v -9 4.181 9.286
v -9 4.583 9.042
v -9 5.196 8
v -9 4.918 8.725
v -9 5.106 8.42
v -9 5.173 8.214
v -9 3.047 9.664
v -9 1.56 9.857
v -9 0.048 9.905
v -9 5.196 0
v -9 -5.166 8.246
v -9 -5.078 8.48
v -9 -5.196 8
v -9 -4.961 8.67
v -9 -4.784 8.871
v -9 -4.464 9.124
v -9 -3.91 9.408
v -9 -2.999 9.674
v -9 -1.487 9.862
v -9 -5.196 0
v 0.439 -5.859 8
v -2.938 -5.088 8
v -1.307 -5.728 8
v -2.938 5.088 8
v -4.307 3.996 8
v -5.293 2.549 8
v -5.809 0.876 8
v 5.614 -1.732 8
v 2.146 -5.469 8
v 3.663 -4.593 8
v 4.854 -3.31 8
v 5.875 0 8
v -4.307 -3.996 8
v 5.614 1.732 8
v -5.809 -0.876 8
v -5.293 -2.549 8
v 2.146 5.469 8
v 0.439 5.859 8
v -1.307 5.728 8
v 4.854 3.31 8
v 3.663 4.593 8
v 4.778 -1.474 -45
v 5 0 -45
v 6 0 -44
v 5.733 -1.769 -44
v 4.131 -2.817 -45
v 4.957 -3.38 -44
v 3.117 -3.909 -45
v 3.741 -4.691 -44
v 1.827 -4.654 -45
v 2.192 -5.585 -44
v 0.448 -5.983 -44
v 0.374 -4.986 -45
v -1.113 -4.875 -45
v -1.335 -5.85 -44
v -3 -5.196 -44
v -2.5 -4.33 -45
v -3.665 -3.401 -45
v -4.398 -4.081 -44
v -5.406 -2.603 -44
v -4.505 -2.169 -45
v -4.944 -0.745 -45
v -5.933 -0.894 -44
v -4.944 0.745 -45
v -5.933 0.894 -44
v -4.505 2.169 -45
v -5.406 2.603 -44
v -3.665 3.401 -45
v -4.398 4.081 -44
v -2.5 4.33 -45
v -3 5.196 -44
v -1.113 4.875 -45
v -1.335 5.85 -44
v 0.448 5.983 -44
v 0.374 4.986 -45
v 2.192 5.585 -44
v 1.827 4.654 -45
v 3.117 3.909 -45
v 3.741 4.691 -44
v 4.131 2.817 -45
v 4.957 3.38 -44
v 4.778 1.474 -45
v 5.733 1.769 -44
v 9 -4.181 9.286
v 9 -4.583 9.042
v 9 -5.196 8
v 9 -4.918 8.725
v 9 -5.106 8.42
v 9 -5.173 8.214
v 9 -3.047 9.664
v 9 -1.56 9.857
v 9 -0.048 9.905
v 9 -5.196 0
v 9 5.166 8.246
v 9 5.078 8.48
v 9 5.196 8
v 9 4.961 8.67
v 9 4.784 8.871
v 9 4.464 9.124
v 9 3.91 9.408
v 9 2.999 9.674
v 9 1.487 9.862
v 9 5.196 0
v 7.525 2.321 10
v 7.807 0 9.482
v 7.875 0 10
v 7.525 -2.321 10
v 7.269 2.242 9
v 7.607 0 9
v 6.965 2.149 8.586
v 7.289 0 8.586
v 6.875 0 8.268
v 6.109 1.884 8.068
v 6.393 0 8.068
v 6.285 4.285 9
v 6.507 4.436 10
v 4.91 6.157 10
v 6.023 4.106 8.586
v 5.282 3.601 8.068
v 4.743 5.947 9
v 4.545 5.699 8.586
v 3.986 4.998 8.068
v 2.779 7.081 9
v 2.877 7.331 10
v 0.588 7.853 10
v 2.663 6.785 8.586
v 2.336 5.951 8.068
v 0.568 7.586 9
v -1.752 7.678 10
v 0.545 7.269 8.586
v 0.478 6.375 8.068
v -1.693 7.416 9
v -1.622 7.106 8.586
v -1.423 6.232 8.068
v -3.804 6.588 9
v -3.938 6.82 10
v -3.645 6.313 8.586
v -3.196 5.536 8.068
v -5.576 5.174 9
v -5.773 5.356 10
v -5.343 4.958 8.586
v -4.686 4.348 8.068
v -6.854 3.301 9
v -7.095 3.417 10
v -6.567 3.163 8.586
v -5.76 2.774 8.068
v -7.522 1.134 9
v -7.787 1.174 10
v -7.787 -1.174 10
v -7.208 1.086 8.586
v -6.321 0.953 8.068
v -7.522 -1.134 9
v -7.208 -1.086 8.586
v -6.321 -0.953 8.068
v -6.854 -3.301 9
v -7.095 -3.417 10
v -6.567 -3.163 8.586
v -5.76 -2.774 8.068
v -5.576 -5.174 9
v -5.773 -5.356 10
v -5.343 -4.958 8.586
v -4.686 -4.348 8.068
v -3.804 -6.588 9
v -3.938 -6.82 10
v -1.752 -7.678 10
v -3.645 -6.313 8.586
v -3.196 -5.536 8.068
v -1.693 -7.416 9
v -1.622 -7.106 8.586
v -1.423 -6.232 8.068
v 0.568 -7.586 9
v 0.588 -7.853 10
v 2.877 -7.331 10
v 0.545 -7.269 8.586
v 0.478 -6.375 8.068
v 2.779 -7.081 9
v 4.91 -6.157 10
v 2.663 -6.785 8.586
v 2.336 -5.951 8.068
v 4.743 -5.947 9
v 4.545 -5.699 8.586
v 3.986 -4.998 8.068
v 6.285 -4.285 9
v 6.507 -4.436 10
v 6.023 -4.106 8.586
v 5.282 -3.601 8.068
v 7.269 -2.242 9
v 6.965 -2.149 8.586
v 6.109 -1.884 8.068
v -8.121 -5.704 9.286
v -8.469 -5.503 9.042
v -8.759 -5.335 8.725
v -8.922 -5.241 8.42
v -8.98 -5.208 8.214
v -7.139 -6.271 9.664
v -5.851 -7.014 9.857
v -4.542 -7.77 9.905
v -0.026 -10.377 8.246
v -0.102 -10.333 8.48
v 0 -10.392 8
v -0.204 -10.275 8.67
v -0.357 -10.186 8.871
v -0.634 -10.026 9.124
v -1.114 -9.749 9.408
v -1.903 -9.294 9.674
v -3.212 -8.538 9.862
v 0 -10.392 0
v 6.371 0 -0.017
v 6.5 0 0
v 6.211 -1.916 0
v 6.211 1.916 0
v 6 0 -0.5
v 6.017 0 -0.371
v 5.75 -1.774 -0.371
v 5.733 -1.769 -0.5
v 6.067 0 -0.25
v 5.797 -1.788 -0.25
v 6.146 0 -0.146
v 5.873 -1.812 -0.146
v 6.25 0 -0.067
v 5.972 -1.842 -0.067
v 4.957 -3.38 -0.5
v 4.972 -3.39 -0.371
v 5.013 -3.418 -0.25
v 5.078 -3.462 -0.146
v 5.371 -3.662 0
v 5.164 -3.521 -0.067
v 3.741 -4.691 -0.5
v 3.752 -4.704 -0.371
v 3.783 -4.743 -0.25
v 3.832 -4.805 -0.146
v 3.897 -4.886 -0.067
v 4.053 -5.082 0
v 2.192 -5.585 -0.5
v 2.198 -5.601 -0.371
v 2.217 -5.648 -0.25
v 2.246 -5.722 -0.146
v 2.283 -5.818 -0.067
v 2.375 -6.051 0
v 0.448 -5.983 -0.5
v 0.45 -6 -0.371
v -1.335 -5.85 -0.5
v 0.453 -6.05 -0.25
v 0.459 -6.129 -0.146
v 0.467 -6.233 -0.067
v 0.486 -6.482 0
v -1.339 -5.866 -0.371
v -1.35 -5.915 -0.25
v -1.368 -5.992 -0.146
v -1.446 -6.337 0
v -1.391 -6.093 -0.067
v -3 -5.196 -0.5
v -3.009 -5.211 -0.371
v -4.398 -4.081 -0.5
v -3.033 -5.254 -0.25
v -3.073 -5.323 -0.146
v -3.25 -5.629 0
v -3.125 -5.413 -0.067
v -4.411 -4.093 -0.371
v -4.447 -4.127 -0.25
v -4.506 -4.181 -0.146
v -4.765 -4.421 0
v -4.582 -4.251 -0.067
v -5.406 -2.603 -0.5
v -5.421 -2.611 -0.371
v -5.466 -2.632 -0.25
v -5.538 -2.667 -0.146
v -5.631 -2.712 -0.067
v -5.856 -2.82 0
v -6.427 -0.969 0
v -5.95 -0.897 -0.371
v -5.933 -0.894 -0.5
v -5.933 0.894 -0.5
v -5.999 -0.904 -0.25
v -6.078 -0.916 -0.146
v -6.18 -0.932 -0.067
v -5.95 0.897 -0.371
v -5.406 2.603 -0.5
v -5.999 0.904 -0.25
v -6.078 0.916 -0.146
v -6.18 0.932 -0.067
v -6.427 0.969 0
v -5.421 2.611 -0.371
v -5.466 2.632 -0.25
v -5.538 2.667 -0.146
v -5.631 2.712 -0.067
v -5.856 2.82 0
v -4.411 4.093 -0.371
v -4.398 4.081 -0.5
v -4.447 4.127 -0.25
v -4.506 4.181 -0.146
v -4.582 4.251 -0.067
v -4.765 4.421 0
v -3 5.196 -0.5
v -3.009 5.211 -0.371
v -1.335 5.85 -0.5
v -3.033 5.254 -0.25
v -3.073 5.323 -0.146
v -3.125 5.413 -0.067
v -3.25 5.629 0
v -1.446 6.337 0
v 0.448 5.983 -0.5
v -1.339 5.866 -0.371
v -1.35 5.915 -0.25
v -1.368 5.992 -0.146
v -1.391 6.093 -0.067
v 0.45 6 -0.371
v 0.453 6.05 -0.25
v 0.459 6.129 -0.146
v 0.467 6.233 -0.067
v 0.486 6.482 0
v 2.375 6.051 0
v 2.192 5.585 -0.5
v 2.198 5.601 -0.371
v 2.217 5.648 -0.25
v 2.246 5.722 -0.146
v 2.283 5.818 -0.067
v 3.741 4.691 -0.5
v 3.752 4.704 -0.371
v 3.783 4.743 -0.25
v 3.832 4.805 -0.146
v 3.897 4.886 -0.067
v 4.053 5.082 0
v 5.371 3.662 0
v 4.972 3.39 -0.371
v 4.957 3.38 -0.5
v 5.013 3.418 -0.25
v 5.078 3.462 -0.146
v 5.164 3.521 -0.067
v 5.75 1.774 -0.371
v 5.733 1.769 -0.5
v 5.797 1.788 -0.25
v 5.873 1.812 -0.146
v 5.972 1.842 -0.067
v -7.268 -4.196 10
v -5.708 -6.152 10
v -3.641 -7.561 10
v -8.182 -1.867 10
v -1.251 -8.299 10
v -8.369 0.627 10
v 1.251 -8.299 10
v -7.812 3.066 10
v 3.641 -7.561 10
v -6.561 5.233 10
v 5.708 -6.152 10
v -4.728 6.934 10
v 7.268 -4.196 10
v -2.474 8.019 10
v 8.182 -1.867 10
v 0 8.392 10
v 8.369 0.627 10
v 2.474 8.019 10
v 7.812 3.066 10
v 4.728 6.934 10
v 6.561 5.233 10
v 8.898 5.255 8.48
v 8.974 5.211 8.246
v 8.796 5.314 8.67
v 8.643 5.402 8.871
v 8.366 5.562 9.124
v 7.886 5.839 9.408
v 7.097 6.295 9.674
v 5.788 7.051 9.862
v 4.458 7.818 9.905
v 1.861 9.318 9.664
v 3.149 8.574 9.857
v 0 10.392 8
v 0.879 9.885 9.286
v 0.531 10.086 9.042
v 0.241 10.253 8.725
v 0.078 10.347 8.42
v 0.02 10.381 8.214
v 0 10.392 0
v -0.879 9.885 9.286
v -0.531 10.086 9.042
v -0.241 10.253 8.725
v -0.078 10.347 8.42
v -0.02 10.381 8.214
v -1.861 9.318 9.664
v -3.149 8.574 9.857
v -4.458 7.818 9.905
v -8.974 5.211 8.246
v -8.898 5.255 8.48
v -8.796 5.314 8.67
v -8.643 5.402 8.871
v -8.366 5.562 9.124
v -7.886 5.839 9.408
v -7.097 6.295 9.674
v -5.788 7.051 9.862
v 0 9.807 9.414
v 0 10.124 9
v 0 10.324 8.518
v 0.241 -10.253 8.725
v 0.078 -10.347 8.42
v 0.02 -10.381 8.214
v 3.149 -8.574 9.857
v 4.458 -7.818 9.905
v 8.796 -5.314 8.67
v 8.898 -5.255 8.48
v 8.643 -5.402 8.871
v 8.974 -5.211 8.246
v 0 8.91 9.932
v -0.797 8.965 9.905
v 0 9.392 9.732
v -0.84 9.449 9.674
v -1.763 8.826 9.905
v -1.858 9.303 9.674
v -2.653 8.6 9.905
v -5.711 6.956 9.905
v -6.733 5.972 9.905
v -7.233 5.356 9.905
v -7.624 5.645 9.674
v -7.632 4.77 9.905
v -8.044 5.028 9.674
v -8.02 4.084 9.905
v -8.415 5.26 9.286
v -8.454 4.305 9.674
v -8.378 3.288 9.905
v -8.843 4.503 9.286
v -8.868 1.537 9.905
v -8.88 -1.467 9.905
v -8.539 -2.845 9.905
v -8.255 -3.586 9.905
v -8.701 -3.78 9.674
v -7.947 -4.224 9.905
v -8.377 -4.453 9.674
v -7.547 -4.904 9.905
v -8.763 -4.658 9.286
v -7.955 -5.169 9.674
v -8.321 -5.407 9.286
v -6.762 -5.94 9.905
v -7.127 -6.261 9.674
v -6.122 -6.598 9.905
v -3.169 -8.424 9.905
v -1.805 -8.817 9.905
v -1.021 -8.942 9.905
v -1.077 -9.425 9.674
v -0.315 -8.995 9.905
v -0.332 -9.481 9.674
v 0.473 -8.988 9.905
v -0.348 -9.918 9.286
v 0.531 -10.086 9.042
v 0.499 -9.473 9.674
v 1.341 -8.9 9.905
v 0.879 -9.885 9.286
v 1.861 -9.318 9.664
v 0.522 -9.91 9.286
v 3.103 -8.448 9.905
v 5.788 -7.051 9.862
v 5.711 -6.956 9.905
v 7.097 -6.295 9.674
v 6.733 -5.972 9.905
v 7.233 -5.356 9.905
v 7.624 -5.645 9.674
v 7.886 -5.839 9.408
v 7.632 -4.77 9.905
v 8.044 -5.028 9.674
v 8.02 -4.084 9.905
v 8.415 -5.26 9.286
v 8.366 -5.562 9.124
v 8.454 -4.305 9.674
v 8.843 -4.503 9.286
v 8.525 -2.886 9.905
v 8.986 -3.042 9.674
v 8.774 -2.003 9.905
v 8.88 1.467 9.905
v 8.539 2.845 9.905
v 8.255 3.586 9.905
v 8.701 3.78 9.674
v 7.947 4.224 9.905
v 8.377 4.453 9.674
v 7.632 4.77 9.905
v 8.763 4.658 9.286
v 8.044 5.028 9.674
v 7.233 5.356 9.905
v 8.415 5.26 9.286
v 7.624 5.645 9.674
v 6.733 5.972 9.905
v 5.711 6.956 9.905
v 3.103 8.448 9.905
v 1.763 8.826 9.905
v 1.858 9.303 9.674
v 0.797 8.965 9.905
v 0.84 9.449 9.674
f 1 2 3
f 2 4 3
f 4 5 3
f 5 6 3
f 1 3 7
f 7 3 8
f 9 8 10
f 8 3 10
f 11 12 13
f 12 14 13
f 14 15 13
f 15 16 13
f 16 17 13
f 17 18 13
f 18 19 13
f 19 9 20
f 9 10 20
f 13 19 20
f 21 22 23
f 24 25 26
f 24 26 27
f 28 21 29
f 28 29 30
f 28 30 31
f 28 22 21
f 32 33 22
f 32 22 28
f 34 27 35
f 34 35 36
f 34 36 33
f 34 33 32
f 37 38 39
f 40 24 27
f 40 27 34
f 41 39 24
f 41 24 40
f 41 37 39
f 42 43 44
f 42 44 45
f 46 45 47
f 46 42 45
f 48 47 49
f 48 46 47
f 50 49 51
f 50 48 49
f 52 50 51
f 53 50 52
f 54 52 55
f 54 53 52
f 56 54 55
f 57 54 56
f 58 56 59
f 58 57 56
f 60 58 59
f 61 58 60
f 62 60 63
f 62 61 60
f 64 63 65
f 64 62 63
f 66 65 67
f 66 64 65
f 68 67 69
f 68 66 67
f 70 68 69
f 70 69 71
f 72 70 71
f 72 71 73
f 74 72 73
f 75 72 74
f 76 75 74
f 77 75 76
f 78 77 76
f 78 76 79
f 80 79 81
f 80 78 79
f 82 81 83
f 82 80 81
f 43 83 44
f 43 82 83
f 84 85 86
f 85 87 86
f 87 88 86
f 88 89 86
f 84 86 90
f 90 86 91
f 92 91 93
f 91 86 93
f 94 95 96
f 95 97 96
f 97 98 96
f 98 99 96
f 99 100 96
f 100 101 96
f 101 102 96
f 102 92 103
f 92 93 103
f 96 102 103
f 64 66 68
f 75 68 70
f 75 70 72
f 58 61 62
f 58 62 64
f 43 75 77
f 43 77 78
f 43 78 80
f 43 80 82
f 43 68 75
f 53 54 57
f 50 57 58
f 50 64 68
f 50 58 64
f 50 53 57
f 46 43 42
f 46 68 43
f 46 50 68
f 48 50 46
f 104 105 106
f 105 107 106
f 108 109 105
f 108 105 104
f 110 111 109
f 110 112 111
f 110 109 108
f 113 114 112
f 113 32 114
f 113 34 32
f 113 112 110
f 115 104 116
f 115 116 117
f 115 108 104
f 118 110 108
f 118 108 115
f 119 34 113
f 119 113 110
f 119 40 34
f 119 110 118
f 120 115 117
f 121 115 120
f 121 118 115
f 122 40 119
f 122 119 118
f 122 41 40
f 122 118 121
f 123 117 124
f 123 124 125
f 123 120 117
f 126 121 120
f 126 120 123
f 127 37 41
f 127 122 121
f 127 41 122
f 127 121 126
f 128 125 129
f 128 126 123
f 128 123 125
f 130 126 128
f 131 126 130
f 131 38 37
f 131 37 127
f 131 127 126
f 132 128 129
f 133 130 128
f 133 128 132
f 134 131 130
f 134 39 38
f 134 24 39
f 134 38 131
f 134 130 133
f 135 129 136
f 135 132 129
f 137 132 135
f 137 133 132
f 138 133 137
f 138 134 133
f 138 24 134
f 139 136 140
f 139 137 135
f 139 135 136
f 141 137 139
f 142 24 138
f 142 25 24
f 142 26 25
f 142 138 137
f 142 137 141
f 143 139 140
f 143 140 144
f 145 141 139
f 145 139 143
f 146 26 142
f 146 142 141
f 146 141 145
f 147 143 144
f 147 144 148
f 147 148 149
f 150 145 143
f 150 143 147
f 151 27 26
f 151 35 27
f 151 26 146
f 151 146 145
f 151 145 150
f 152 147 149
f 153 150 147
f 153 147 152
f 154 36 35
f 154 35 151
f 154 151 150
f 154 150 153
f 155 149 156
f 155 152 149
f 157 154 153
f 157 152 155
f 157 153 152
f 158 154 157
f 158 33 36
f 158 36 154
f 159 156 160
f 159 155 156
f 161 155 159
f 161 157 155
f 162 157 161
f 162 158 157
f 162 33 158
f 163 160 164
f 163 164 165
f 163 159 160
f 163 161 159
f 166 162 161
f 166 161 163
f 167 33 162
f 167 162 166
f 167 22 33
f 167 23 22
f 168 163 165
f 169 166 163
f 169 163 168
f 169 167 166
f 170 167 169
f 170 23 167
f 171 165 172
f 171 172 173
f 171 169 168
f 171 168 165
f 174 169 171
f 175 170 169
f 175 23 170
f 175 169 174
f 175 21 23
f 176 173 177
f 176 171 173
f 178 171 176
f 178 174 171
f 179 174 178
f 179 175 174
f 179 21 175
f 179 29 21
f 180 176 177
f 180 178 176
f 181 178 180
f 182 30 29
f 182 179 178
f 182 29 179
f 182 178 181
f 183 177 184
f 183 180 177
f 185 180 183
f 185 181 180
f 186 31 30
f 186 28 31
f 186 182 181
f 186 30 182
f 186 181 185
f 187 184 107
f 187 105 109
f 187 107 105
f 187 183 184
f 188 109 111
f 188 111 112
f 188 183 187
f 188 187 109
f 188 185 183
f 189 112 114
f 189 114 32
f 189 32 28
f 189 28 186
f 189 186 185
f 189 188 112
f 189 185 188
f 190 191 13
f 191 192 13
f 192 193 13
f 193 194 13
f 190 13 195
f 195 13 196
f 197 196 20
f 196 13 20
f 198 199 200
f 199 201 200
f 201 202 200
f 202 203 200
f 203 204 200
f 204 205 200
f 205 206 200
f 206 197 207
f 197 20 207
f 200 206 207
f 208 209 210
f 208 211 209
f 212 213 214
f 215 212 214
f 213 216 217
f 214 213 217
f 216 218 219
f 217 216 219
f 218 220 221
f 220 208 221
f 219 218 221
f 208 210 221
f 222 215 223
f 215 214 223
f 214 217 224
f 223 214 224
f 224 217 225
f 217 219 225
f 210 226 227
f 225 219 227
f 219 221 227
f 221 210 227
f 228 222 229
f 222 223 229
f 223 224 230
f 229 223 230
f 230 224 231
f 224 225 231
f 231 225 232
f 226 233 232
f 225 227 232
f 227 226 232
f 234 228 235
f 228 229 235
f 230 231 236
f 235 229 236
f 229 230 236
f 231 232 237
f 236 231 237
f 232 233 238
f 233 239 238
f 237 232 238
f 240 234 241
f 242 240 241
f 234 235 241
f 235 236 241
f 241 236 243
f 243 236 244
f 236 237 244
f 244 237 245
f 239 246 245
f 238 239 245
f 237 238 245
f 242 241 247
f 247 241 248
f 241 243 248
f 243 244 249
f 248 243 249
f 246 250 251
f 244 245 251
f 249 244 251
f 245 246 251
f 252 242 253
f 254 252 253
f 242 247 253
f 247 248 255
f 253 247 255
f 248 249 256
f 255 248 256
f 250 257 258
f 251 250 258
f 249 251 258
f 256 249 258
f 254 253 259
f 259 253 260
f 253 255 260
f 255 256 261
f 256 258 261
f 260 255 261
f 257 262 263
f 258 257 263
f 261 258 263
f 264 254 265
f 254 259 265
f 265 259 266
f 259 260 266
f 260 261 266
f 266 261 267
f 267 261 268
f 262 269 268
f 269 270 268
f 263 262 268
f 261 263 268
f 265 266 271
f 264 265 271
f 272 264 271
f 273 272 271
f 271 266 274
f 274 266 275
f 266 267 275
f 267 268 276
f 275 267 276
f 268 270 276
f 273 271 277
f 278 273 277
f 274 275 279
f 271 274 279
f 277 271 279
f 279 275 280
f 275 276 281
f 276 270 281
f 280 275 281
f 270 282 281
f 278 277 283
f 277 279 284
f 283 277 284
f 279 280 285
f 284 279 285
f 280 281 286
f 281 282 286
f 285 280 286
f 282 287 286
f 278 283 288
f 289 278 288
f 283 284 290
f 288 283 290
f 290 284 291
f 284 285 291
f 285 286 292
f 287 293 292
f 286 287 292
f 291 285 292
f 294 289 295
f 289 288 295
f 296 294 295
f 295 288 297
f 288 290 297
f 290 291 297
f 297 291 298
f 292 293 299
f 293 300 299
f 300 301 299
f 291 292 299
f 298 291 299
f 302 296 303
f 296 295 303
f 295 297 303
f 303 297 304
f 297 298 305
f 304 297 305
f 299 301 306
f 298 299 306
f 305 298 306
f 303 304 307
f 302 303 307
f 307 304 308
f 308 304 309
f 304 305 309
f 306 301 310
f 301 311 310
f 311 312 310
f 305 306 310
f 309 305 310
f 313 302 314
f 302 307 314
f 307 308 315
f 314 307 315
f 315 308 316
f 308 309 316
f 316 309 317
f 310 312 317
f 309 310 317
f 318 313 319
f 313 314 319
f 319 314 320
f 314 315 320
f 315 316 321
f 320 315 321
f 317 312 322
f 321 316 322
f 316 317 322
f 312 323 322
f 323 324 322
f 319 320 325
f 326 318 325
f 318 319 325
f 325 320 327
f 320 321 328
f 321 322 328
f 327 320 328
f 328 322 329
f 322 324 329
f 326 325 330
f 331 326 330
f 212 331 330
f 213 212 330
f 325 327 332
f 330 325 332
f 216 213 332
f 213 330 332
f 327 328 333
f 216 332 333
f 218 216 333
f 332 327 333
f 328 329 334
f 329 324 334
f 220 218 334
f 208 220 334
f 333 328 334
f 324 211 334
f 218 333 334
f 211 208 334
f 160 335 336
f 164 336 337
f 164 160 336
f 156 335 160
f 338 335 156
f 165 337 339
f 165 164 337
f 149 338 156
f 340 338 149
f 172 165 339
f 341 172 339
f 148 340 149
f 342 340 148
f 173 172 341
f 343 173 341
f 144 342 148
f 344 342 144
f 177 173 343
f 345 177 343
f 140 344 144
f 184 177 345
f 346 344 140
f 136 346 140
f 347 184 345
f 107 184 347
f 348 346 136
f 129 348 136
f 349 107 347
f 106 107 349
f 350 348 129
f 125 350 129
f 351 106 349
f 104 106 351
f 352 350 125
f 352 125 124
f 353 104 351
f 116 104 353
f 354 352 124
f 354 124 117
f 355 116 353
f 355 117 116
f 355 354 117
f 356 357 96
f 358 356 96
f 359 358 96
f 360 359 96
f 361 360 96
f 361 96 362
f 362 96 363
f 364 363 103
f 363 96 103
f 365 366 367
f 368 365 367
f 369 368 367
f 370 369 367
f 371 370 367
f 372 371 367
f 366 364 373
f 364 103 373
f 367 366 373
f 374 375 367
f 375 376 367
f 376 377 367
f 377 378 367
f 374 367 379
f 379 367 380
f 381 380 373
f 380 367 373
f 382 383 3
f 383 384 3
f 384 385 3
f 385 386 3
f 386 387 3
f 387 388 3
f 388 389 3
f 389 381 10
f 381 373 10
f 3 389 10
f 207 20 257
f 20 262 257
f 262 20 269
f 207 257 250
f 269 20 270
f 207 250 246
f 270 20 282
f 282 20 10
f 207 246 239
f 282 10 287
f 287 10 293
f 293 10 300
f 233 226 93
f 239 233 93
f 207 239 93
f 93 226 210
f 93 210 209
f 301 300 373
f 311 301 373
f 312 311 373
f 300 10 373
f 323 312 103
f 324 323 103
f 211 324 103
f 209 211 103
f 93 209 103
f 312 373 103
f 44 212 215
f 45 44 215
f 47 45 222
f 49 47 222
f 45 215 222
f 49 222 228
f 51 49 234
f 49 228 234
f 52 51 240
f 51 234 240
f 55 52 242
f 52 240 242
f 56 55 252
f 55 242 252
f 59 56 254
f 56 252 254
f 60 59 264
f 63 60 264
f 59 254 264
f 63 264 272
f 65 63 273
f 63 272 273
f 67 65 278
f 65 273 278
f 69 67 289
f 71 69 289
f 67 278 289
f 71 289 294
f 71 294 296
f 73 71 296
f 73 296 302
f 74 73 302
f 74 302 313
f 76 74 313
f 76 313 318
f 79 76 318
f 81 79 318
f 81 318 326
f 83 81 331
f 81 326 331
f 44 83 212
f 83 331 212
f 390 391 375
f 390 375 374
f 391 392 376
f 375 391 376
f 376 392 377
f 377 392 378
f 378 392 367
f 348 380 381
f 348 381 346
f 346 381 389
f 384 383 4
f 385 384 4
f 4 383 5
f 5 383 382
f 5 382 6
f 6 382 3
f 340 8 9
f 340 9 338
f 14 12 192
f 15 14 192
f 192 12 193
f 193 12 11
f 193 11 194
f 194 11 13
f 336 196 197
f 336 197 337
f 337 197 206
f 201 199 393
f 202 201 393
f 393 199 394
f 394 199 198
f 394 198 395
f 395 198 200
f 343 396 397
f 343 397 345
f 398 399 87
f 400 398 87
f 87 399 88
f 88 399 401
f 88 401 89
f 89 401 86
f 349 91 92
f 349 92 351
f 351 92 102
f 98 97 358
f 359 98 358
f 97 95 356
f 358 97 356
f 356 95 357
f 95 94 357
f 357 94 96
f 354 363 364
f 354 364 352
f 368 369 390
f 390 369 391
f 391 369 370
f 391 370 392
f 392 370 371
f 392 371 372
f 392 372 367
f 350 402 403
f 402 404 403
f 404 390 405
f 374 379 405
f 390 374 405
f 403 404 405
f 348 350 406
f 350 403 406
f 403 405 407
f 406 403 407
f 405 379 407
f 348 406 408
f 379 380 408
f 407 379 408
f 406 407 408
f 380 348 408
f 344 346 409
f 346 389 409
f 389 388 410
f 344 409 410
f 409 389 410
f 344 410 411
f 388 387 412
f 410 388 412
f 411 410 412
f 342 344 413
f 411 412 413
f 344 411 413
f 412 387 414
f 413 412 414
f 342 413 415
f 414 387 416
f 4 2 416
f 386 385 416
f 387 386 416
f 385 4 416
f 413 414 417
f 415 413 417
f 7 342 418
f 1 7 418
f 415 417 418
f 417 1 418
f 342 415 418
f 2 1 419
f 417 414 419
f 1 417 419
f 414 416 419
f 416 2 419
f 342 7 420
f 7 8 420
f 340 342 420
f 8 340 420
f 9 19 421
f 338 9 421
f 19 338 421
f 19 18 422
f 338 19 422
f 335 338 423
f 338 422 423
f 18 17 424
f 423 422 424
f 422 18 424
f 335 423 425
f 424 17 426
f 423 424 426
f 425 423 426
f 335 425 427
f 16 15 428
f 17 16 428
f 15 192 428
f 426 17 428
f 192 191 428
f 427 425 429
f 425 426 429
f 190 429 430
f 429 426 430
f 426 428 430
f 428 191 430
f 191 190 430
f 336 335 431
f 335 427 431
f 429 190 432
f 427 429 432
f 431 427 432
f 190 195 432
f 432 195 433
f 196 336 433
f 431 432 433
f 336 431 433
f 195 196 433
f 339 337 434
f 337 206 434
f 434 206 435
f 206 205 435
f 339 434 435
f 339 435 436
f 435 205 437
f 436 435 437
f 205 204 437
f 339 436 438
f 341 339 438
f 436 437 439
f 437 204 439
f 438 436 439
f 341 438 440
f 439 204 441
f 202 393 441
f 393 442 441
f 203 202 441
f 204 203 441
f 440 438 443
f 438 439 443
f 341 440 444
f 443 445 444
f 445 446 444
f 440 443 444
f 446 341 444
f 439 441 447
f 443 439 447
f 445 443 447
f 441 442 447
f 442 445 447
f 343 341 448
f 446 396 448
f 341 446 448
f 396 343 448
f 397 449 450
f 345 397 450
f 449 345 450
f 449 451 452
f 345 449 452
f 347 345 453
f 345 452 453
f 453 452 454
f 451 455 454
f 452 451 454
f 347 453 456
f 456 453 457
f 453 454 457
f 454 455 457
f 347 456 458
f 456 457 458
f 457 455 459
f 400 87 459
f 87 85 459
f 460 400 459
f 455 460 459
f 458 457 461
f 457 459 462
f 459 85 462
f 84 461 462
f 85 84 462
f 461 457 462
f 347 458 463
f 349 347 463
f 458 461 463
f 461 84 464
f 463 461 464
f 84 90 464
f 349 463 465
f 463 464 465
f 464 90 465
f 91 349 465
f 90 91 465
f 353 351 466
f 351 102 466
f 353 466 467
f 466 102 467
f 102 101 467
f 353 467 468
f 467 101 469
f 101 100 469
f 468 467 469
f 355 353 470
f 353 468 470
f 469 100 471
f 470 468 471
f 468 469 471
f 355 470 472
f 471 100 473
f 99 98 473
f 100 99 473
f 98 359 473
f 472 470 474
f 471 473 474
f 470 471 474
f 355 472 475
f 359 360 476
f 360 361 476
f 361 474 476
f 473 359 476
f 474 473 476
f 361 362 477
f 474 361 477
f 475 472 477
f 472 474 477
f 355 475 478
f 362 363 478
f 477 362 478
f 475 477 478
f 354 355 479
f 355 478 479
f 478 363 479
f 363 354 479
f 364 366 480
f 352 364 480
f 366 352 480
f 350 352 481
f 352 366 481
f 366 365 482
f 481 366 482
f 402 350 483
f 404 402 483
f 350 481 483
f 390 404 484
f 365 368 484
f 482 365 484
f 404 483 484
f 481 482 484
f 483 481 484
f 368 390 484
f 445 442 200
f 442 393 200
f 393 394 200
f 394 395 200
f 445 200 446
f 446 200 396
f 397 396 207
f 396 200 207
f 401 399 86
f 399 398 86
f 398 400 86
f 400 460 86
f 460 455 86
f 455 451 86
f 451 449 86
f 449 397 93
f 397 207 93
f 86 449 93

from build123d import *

# Parameters (mm, degrees)
BOSS_EXTRUDE1_DEPTH = 10
SKETCH4_R           = 6
BOSS_EXTRUDE2_DEPTH = 45
CHAMFER1_SIZE       = 1
FILLET1_R           = 0.5
SKETCH6_R           = 7.875
CUT_EXTRUDE1_DEPTH  = 2
FILLET2_R           = 2


with BuildPart() as part:
    # Sketch3 → Boss-Extrude1 (new body)
    with BuildSketch(Plane.XY):
        Polygon((0, 10.392304845), (-9, 5.196152423), (-9, -5.196152423), (0, -10.392304845), (9, -5.196152423), (9, 5.196152423), align=None)
    extrude(amount=BOSS_EXTRUDE1_DEPTH)

    # Sketch4 → Boss-Extrude2 (add)
    with BuildSketch(Plane(origin=(0, 0, 0), x_dir=(-1, 0, 0), z_dir=(0, 0, -1))):
        with Locations(Location((0, 0, 0), (0, 0, 180))):
            Circle(SKETCH4_R)
    extrude(amount=BOSS_EXTRUDE2_DEPTH)

    # Chamfer1
    chamfer1_edges = [part.edges().sort_by_distance(p)[0] for p in [
        (-6, 0, -45),
    ]]
    chamfer(chamfer1_edges, length=CHAMFER1_SIZE)

    # Fillet1
    fillet1_edges = [part.edges().sort_by_distance(p)[0] for p in [
        (-6, 0, 0),
    ]]
    fillet(fillet1_edges, radius=FILLET1_R)

    # Sketch5 → Cut-Revolve1 (revolve, cut)
    with BuildSketch(Plane(origin=(0, 0, 0), x_dir=(0, 0, -1), z_dir=(1, 0, 0))):
        with BuildLine():
            Line((-8, 10.392304845), (-10, 10.392304845))
            Line((-10, 10.392304845), (-10, 8.392304845))
            ThreePointArc((-10, 8.392304845), (-9.414213562, 9.806518408), (-8, 10.392304845))
        make_face()
    revolve(axis=Axis((0, 0, 0), (0, 0, 1)), mode=Mode.SUBTRACT)

    # Sketch6 → Cut-Extrude1 (cut)
    with BuildSketch(Plane.XY.offset(10)):
        Circle(SKETCH6_R)
    extrude(amount=-CUT_EXTRUDE1_DEPTH, mode=Mode.SUBTRACT)

    # Fillet2
    fillet2_edges = [part.edges().sort_by_distance(p)[0] for p in [
        (-7.875, 0, 8),
    ]]
    fillet(fillet2_edges, radius=FILLET2_R - 0.0001)  # a hair under: the kernel refuses the full size


solid = part.part
